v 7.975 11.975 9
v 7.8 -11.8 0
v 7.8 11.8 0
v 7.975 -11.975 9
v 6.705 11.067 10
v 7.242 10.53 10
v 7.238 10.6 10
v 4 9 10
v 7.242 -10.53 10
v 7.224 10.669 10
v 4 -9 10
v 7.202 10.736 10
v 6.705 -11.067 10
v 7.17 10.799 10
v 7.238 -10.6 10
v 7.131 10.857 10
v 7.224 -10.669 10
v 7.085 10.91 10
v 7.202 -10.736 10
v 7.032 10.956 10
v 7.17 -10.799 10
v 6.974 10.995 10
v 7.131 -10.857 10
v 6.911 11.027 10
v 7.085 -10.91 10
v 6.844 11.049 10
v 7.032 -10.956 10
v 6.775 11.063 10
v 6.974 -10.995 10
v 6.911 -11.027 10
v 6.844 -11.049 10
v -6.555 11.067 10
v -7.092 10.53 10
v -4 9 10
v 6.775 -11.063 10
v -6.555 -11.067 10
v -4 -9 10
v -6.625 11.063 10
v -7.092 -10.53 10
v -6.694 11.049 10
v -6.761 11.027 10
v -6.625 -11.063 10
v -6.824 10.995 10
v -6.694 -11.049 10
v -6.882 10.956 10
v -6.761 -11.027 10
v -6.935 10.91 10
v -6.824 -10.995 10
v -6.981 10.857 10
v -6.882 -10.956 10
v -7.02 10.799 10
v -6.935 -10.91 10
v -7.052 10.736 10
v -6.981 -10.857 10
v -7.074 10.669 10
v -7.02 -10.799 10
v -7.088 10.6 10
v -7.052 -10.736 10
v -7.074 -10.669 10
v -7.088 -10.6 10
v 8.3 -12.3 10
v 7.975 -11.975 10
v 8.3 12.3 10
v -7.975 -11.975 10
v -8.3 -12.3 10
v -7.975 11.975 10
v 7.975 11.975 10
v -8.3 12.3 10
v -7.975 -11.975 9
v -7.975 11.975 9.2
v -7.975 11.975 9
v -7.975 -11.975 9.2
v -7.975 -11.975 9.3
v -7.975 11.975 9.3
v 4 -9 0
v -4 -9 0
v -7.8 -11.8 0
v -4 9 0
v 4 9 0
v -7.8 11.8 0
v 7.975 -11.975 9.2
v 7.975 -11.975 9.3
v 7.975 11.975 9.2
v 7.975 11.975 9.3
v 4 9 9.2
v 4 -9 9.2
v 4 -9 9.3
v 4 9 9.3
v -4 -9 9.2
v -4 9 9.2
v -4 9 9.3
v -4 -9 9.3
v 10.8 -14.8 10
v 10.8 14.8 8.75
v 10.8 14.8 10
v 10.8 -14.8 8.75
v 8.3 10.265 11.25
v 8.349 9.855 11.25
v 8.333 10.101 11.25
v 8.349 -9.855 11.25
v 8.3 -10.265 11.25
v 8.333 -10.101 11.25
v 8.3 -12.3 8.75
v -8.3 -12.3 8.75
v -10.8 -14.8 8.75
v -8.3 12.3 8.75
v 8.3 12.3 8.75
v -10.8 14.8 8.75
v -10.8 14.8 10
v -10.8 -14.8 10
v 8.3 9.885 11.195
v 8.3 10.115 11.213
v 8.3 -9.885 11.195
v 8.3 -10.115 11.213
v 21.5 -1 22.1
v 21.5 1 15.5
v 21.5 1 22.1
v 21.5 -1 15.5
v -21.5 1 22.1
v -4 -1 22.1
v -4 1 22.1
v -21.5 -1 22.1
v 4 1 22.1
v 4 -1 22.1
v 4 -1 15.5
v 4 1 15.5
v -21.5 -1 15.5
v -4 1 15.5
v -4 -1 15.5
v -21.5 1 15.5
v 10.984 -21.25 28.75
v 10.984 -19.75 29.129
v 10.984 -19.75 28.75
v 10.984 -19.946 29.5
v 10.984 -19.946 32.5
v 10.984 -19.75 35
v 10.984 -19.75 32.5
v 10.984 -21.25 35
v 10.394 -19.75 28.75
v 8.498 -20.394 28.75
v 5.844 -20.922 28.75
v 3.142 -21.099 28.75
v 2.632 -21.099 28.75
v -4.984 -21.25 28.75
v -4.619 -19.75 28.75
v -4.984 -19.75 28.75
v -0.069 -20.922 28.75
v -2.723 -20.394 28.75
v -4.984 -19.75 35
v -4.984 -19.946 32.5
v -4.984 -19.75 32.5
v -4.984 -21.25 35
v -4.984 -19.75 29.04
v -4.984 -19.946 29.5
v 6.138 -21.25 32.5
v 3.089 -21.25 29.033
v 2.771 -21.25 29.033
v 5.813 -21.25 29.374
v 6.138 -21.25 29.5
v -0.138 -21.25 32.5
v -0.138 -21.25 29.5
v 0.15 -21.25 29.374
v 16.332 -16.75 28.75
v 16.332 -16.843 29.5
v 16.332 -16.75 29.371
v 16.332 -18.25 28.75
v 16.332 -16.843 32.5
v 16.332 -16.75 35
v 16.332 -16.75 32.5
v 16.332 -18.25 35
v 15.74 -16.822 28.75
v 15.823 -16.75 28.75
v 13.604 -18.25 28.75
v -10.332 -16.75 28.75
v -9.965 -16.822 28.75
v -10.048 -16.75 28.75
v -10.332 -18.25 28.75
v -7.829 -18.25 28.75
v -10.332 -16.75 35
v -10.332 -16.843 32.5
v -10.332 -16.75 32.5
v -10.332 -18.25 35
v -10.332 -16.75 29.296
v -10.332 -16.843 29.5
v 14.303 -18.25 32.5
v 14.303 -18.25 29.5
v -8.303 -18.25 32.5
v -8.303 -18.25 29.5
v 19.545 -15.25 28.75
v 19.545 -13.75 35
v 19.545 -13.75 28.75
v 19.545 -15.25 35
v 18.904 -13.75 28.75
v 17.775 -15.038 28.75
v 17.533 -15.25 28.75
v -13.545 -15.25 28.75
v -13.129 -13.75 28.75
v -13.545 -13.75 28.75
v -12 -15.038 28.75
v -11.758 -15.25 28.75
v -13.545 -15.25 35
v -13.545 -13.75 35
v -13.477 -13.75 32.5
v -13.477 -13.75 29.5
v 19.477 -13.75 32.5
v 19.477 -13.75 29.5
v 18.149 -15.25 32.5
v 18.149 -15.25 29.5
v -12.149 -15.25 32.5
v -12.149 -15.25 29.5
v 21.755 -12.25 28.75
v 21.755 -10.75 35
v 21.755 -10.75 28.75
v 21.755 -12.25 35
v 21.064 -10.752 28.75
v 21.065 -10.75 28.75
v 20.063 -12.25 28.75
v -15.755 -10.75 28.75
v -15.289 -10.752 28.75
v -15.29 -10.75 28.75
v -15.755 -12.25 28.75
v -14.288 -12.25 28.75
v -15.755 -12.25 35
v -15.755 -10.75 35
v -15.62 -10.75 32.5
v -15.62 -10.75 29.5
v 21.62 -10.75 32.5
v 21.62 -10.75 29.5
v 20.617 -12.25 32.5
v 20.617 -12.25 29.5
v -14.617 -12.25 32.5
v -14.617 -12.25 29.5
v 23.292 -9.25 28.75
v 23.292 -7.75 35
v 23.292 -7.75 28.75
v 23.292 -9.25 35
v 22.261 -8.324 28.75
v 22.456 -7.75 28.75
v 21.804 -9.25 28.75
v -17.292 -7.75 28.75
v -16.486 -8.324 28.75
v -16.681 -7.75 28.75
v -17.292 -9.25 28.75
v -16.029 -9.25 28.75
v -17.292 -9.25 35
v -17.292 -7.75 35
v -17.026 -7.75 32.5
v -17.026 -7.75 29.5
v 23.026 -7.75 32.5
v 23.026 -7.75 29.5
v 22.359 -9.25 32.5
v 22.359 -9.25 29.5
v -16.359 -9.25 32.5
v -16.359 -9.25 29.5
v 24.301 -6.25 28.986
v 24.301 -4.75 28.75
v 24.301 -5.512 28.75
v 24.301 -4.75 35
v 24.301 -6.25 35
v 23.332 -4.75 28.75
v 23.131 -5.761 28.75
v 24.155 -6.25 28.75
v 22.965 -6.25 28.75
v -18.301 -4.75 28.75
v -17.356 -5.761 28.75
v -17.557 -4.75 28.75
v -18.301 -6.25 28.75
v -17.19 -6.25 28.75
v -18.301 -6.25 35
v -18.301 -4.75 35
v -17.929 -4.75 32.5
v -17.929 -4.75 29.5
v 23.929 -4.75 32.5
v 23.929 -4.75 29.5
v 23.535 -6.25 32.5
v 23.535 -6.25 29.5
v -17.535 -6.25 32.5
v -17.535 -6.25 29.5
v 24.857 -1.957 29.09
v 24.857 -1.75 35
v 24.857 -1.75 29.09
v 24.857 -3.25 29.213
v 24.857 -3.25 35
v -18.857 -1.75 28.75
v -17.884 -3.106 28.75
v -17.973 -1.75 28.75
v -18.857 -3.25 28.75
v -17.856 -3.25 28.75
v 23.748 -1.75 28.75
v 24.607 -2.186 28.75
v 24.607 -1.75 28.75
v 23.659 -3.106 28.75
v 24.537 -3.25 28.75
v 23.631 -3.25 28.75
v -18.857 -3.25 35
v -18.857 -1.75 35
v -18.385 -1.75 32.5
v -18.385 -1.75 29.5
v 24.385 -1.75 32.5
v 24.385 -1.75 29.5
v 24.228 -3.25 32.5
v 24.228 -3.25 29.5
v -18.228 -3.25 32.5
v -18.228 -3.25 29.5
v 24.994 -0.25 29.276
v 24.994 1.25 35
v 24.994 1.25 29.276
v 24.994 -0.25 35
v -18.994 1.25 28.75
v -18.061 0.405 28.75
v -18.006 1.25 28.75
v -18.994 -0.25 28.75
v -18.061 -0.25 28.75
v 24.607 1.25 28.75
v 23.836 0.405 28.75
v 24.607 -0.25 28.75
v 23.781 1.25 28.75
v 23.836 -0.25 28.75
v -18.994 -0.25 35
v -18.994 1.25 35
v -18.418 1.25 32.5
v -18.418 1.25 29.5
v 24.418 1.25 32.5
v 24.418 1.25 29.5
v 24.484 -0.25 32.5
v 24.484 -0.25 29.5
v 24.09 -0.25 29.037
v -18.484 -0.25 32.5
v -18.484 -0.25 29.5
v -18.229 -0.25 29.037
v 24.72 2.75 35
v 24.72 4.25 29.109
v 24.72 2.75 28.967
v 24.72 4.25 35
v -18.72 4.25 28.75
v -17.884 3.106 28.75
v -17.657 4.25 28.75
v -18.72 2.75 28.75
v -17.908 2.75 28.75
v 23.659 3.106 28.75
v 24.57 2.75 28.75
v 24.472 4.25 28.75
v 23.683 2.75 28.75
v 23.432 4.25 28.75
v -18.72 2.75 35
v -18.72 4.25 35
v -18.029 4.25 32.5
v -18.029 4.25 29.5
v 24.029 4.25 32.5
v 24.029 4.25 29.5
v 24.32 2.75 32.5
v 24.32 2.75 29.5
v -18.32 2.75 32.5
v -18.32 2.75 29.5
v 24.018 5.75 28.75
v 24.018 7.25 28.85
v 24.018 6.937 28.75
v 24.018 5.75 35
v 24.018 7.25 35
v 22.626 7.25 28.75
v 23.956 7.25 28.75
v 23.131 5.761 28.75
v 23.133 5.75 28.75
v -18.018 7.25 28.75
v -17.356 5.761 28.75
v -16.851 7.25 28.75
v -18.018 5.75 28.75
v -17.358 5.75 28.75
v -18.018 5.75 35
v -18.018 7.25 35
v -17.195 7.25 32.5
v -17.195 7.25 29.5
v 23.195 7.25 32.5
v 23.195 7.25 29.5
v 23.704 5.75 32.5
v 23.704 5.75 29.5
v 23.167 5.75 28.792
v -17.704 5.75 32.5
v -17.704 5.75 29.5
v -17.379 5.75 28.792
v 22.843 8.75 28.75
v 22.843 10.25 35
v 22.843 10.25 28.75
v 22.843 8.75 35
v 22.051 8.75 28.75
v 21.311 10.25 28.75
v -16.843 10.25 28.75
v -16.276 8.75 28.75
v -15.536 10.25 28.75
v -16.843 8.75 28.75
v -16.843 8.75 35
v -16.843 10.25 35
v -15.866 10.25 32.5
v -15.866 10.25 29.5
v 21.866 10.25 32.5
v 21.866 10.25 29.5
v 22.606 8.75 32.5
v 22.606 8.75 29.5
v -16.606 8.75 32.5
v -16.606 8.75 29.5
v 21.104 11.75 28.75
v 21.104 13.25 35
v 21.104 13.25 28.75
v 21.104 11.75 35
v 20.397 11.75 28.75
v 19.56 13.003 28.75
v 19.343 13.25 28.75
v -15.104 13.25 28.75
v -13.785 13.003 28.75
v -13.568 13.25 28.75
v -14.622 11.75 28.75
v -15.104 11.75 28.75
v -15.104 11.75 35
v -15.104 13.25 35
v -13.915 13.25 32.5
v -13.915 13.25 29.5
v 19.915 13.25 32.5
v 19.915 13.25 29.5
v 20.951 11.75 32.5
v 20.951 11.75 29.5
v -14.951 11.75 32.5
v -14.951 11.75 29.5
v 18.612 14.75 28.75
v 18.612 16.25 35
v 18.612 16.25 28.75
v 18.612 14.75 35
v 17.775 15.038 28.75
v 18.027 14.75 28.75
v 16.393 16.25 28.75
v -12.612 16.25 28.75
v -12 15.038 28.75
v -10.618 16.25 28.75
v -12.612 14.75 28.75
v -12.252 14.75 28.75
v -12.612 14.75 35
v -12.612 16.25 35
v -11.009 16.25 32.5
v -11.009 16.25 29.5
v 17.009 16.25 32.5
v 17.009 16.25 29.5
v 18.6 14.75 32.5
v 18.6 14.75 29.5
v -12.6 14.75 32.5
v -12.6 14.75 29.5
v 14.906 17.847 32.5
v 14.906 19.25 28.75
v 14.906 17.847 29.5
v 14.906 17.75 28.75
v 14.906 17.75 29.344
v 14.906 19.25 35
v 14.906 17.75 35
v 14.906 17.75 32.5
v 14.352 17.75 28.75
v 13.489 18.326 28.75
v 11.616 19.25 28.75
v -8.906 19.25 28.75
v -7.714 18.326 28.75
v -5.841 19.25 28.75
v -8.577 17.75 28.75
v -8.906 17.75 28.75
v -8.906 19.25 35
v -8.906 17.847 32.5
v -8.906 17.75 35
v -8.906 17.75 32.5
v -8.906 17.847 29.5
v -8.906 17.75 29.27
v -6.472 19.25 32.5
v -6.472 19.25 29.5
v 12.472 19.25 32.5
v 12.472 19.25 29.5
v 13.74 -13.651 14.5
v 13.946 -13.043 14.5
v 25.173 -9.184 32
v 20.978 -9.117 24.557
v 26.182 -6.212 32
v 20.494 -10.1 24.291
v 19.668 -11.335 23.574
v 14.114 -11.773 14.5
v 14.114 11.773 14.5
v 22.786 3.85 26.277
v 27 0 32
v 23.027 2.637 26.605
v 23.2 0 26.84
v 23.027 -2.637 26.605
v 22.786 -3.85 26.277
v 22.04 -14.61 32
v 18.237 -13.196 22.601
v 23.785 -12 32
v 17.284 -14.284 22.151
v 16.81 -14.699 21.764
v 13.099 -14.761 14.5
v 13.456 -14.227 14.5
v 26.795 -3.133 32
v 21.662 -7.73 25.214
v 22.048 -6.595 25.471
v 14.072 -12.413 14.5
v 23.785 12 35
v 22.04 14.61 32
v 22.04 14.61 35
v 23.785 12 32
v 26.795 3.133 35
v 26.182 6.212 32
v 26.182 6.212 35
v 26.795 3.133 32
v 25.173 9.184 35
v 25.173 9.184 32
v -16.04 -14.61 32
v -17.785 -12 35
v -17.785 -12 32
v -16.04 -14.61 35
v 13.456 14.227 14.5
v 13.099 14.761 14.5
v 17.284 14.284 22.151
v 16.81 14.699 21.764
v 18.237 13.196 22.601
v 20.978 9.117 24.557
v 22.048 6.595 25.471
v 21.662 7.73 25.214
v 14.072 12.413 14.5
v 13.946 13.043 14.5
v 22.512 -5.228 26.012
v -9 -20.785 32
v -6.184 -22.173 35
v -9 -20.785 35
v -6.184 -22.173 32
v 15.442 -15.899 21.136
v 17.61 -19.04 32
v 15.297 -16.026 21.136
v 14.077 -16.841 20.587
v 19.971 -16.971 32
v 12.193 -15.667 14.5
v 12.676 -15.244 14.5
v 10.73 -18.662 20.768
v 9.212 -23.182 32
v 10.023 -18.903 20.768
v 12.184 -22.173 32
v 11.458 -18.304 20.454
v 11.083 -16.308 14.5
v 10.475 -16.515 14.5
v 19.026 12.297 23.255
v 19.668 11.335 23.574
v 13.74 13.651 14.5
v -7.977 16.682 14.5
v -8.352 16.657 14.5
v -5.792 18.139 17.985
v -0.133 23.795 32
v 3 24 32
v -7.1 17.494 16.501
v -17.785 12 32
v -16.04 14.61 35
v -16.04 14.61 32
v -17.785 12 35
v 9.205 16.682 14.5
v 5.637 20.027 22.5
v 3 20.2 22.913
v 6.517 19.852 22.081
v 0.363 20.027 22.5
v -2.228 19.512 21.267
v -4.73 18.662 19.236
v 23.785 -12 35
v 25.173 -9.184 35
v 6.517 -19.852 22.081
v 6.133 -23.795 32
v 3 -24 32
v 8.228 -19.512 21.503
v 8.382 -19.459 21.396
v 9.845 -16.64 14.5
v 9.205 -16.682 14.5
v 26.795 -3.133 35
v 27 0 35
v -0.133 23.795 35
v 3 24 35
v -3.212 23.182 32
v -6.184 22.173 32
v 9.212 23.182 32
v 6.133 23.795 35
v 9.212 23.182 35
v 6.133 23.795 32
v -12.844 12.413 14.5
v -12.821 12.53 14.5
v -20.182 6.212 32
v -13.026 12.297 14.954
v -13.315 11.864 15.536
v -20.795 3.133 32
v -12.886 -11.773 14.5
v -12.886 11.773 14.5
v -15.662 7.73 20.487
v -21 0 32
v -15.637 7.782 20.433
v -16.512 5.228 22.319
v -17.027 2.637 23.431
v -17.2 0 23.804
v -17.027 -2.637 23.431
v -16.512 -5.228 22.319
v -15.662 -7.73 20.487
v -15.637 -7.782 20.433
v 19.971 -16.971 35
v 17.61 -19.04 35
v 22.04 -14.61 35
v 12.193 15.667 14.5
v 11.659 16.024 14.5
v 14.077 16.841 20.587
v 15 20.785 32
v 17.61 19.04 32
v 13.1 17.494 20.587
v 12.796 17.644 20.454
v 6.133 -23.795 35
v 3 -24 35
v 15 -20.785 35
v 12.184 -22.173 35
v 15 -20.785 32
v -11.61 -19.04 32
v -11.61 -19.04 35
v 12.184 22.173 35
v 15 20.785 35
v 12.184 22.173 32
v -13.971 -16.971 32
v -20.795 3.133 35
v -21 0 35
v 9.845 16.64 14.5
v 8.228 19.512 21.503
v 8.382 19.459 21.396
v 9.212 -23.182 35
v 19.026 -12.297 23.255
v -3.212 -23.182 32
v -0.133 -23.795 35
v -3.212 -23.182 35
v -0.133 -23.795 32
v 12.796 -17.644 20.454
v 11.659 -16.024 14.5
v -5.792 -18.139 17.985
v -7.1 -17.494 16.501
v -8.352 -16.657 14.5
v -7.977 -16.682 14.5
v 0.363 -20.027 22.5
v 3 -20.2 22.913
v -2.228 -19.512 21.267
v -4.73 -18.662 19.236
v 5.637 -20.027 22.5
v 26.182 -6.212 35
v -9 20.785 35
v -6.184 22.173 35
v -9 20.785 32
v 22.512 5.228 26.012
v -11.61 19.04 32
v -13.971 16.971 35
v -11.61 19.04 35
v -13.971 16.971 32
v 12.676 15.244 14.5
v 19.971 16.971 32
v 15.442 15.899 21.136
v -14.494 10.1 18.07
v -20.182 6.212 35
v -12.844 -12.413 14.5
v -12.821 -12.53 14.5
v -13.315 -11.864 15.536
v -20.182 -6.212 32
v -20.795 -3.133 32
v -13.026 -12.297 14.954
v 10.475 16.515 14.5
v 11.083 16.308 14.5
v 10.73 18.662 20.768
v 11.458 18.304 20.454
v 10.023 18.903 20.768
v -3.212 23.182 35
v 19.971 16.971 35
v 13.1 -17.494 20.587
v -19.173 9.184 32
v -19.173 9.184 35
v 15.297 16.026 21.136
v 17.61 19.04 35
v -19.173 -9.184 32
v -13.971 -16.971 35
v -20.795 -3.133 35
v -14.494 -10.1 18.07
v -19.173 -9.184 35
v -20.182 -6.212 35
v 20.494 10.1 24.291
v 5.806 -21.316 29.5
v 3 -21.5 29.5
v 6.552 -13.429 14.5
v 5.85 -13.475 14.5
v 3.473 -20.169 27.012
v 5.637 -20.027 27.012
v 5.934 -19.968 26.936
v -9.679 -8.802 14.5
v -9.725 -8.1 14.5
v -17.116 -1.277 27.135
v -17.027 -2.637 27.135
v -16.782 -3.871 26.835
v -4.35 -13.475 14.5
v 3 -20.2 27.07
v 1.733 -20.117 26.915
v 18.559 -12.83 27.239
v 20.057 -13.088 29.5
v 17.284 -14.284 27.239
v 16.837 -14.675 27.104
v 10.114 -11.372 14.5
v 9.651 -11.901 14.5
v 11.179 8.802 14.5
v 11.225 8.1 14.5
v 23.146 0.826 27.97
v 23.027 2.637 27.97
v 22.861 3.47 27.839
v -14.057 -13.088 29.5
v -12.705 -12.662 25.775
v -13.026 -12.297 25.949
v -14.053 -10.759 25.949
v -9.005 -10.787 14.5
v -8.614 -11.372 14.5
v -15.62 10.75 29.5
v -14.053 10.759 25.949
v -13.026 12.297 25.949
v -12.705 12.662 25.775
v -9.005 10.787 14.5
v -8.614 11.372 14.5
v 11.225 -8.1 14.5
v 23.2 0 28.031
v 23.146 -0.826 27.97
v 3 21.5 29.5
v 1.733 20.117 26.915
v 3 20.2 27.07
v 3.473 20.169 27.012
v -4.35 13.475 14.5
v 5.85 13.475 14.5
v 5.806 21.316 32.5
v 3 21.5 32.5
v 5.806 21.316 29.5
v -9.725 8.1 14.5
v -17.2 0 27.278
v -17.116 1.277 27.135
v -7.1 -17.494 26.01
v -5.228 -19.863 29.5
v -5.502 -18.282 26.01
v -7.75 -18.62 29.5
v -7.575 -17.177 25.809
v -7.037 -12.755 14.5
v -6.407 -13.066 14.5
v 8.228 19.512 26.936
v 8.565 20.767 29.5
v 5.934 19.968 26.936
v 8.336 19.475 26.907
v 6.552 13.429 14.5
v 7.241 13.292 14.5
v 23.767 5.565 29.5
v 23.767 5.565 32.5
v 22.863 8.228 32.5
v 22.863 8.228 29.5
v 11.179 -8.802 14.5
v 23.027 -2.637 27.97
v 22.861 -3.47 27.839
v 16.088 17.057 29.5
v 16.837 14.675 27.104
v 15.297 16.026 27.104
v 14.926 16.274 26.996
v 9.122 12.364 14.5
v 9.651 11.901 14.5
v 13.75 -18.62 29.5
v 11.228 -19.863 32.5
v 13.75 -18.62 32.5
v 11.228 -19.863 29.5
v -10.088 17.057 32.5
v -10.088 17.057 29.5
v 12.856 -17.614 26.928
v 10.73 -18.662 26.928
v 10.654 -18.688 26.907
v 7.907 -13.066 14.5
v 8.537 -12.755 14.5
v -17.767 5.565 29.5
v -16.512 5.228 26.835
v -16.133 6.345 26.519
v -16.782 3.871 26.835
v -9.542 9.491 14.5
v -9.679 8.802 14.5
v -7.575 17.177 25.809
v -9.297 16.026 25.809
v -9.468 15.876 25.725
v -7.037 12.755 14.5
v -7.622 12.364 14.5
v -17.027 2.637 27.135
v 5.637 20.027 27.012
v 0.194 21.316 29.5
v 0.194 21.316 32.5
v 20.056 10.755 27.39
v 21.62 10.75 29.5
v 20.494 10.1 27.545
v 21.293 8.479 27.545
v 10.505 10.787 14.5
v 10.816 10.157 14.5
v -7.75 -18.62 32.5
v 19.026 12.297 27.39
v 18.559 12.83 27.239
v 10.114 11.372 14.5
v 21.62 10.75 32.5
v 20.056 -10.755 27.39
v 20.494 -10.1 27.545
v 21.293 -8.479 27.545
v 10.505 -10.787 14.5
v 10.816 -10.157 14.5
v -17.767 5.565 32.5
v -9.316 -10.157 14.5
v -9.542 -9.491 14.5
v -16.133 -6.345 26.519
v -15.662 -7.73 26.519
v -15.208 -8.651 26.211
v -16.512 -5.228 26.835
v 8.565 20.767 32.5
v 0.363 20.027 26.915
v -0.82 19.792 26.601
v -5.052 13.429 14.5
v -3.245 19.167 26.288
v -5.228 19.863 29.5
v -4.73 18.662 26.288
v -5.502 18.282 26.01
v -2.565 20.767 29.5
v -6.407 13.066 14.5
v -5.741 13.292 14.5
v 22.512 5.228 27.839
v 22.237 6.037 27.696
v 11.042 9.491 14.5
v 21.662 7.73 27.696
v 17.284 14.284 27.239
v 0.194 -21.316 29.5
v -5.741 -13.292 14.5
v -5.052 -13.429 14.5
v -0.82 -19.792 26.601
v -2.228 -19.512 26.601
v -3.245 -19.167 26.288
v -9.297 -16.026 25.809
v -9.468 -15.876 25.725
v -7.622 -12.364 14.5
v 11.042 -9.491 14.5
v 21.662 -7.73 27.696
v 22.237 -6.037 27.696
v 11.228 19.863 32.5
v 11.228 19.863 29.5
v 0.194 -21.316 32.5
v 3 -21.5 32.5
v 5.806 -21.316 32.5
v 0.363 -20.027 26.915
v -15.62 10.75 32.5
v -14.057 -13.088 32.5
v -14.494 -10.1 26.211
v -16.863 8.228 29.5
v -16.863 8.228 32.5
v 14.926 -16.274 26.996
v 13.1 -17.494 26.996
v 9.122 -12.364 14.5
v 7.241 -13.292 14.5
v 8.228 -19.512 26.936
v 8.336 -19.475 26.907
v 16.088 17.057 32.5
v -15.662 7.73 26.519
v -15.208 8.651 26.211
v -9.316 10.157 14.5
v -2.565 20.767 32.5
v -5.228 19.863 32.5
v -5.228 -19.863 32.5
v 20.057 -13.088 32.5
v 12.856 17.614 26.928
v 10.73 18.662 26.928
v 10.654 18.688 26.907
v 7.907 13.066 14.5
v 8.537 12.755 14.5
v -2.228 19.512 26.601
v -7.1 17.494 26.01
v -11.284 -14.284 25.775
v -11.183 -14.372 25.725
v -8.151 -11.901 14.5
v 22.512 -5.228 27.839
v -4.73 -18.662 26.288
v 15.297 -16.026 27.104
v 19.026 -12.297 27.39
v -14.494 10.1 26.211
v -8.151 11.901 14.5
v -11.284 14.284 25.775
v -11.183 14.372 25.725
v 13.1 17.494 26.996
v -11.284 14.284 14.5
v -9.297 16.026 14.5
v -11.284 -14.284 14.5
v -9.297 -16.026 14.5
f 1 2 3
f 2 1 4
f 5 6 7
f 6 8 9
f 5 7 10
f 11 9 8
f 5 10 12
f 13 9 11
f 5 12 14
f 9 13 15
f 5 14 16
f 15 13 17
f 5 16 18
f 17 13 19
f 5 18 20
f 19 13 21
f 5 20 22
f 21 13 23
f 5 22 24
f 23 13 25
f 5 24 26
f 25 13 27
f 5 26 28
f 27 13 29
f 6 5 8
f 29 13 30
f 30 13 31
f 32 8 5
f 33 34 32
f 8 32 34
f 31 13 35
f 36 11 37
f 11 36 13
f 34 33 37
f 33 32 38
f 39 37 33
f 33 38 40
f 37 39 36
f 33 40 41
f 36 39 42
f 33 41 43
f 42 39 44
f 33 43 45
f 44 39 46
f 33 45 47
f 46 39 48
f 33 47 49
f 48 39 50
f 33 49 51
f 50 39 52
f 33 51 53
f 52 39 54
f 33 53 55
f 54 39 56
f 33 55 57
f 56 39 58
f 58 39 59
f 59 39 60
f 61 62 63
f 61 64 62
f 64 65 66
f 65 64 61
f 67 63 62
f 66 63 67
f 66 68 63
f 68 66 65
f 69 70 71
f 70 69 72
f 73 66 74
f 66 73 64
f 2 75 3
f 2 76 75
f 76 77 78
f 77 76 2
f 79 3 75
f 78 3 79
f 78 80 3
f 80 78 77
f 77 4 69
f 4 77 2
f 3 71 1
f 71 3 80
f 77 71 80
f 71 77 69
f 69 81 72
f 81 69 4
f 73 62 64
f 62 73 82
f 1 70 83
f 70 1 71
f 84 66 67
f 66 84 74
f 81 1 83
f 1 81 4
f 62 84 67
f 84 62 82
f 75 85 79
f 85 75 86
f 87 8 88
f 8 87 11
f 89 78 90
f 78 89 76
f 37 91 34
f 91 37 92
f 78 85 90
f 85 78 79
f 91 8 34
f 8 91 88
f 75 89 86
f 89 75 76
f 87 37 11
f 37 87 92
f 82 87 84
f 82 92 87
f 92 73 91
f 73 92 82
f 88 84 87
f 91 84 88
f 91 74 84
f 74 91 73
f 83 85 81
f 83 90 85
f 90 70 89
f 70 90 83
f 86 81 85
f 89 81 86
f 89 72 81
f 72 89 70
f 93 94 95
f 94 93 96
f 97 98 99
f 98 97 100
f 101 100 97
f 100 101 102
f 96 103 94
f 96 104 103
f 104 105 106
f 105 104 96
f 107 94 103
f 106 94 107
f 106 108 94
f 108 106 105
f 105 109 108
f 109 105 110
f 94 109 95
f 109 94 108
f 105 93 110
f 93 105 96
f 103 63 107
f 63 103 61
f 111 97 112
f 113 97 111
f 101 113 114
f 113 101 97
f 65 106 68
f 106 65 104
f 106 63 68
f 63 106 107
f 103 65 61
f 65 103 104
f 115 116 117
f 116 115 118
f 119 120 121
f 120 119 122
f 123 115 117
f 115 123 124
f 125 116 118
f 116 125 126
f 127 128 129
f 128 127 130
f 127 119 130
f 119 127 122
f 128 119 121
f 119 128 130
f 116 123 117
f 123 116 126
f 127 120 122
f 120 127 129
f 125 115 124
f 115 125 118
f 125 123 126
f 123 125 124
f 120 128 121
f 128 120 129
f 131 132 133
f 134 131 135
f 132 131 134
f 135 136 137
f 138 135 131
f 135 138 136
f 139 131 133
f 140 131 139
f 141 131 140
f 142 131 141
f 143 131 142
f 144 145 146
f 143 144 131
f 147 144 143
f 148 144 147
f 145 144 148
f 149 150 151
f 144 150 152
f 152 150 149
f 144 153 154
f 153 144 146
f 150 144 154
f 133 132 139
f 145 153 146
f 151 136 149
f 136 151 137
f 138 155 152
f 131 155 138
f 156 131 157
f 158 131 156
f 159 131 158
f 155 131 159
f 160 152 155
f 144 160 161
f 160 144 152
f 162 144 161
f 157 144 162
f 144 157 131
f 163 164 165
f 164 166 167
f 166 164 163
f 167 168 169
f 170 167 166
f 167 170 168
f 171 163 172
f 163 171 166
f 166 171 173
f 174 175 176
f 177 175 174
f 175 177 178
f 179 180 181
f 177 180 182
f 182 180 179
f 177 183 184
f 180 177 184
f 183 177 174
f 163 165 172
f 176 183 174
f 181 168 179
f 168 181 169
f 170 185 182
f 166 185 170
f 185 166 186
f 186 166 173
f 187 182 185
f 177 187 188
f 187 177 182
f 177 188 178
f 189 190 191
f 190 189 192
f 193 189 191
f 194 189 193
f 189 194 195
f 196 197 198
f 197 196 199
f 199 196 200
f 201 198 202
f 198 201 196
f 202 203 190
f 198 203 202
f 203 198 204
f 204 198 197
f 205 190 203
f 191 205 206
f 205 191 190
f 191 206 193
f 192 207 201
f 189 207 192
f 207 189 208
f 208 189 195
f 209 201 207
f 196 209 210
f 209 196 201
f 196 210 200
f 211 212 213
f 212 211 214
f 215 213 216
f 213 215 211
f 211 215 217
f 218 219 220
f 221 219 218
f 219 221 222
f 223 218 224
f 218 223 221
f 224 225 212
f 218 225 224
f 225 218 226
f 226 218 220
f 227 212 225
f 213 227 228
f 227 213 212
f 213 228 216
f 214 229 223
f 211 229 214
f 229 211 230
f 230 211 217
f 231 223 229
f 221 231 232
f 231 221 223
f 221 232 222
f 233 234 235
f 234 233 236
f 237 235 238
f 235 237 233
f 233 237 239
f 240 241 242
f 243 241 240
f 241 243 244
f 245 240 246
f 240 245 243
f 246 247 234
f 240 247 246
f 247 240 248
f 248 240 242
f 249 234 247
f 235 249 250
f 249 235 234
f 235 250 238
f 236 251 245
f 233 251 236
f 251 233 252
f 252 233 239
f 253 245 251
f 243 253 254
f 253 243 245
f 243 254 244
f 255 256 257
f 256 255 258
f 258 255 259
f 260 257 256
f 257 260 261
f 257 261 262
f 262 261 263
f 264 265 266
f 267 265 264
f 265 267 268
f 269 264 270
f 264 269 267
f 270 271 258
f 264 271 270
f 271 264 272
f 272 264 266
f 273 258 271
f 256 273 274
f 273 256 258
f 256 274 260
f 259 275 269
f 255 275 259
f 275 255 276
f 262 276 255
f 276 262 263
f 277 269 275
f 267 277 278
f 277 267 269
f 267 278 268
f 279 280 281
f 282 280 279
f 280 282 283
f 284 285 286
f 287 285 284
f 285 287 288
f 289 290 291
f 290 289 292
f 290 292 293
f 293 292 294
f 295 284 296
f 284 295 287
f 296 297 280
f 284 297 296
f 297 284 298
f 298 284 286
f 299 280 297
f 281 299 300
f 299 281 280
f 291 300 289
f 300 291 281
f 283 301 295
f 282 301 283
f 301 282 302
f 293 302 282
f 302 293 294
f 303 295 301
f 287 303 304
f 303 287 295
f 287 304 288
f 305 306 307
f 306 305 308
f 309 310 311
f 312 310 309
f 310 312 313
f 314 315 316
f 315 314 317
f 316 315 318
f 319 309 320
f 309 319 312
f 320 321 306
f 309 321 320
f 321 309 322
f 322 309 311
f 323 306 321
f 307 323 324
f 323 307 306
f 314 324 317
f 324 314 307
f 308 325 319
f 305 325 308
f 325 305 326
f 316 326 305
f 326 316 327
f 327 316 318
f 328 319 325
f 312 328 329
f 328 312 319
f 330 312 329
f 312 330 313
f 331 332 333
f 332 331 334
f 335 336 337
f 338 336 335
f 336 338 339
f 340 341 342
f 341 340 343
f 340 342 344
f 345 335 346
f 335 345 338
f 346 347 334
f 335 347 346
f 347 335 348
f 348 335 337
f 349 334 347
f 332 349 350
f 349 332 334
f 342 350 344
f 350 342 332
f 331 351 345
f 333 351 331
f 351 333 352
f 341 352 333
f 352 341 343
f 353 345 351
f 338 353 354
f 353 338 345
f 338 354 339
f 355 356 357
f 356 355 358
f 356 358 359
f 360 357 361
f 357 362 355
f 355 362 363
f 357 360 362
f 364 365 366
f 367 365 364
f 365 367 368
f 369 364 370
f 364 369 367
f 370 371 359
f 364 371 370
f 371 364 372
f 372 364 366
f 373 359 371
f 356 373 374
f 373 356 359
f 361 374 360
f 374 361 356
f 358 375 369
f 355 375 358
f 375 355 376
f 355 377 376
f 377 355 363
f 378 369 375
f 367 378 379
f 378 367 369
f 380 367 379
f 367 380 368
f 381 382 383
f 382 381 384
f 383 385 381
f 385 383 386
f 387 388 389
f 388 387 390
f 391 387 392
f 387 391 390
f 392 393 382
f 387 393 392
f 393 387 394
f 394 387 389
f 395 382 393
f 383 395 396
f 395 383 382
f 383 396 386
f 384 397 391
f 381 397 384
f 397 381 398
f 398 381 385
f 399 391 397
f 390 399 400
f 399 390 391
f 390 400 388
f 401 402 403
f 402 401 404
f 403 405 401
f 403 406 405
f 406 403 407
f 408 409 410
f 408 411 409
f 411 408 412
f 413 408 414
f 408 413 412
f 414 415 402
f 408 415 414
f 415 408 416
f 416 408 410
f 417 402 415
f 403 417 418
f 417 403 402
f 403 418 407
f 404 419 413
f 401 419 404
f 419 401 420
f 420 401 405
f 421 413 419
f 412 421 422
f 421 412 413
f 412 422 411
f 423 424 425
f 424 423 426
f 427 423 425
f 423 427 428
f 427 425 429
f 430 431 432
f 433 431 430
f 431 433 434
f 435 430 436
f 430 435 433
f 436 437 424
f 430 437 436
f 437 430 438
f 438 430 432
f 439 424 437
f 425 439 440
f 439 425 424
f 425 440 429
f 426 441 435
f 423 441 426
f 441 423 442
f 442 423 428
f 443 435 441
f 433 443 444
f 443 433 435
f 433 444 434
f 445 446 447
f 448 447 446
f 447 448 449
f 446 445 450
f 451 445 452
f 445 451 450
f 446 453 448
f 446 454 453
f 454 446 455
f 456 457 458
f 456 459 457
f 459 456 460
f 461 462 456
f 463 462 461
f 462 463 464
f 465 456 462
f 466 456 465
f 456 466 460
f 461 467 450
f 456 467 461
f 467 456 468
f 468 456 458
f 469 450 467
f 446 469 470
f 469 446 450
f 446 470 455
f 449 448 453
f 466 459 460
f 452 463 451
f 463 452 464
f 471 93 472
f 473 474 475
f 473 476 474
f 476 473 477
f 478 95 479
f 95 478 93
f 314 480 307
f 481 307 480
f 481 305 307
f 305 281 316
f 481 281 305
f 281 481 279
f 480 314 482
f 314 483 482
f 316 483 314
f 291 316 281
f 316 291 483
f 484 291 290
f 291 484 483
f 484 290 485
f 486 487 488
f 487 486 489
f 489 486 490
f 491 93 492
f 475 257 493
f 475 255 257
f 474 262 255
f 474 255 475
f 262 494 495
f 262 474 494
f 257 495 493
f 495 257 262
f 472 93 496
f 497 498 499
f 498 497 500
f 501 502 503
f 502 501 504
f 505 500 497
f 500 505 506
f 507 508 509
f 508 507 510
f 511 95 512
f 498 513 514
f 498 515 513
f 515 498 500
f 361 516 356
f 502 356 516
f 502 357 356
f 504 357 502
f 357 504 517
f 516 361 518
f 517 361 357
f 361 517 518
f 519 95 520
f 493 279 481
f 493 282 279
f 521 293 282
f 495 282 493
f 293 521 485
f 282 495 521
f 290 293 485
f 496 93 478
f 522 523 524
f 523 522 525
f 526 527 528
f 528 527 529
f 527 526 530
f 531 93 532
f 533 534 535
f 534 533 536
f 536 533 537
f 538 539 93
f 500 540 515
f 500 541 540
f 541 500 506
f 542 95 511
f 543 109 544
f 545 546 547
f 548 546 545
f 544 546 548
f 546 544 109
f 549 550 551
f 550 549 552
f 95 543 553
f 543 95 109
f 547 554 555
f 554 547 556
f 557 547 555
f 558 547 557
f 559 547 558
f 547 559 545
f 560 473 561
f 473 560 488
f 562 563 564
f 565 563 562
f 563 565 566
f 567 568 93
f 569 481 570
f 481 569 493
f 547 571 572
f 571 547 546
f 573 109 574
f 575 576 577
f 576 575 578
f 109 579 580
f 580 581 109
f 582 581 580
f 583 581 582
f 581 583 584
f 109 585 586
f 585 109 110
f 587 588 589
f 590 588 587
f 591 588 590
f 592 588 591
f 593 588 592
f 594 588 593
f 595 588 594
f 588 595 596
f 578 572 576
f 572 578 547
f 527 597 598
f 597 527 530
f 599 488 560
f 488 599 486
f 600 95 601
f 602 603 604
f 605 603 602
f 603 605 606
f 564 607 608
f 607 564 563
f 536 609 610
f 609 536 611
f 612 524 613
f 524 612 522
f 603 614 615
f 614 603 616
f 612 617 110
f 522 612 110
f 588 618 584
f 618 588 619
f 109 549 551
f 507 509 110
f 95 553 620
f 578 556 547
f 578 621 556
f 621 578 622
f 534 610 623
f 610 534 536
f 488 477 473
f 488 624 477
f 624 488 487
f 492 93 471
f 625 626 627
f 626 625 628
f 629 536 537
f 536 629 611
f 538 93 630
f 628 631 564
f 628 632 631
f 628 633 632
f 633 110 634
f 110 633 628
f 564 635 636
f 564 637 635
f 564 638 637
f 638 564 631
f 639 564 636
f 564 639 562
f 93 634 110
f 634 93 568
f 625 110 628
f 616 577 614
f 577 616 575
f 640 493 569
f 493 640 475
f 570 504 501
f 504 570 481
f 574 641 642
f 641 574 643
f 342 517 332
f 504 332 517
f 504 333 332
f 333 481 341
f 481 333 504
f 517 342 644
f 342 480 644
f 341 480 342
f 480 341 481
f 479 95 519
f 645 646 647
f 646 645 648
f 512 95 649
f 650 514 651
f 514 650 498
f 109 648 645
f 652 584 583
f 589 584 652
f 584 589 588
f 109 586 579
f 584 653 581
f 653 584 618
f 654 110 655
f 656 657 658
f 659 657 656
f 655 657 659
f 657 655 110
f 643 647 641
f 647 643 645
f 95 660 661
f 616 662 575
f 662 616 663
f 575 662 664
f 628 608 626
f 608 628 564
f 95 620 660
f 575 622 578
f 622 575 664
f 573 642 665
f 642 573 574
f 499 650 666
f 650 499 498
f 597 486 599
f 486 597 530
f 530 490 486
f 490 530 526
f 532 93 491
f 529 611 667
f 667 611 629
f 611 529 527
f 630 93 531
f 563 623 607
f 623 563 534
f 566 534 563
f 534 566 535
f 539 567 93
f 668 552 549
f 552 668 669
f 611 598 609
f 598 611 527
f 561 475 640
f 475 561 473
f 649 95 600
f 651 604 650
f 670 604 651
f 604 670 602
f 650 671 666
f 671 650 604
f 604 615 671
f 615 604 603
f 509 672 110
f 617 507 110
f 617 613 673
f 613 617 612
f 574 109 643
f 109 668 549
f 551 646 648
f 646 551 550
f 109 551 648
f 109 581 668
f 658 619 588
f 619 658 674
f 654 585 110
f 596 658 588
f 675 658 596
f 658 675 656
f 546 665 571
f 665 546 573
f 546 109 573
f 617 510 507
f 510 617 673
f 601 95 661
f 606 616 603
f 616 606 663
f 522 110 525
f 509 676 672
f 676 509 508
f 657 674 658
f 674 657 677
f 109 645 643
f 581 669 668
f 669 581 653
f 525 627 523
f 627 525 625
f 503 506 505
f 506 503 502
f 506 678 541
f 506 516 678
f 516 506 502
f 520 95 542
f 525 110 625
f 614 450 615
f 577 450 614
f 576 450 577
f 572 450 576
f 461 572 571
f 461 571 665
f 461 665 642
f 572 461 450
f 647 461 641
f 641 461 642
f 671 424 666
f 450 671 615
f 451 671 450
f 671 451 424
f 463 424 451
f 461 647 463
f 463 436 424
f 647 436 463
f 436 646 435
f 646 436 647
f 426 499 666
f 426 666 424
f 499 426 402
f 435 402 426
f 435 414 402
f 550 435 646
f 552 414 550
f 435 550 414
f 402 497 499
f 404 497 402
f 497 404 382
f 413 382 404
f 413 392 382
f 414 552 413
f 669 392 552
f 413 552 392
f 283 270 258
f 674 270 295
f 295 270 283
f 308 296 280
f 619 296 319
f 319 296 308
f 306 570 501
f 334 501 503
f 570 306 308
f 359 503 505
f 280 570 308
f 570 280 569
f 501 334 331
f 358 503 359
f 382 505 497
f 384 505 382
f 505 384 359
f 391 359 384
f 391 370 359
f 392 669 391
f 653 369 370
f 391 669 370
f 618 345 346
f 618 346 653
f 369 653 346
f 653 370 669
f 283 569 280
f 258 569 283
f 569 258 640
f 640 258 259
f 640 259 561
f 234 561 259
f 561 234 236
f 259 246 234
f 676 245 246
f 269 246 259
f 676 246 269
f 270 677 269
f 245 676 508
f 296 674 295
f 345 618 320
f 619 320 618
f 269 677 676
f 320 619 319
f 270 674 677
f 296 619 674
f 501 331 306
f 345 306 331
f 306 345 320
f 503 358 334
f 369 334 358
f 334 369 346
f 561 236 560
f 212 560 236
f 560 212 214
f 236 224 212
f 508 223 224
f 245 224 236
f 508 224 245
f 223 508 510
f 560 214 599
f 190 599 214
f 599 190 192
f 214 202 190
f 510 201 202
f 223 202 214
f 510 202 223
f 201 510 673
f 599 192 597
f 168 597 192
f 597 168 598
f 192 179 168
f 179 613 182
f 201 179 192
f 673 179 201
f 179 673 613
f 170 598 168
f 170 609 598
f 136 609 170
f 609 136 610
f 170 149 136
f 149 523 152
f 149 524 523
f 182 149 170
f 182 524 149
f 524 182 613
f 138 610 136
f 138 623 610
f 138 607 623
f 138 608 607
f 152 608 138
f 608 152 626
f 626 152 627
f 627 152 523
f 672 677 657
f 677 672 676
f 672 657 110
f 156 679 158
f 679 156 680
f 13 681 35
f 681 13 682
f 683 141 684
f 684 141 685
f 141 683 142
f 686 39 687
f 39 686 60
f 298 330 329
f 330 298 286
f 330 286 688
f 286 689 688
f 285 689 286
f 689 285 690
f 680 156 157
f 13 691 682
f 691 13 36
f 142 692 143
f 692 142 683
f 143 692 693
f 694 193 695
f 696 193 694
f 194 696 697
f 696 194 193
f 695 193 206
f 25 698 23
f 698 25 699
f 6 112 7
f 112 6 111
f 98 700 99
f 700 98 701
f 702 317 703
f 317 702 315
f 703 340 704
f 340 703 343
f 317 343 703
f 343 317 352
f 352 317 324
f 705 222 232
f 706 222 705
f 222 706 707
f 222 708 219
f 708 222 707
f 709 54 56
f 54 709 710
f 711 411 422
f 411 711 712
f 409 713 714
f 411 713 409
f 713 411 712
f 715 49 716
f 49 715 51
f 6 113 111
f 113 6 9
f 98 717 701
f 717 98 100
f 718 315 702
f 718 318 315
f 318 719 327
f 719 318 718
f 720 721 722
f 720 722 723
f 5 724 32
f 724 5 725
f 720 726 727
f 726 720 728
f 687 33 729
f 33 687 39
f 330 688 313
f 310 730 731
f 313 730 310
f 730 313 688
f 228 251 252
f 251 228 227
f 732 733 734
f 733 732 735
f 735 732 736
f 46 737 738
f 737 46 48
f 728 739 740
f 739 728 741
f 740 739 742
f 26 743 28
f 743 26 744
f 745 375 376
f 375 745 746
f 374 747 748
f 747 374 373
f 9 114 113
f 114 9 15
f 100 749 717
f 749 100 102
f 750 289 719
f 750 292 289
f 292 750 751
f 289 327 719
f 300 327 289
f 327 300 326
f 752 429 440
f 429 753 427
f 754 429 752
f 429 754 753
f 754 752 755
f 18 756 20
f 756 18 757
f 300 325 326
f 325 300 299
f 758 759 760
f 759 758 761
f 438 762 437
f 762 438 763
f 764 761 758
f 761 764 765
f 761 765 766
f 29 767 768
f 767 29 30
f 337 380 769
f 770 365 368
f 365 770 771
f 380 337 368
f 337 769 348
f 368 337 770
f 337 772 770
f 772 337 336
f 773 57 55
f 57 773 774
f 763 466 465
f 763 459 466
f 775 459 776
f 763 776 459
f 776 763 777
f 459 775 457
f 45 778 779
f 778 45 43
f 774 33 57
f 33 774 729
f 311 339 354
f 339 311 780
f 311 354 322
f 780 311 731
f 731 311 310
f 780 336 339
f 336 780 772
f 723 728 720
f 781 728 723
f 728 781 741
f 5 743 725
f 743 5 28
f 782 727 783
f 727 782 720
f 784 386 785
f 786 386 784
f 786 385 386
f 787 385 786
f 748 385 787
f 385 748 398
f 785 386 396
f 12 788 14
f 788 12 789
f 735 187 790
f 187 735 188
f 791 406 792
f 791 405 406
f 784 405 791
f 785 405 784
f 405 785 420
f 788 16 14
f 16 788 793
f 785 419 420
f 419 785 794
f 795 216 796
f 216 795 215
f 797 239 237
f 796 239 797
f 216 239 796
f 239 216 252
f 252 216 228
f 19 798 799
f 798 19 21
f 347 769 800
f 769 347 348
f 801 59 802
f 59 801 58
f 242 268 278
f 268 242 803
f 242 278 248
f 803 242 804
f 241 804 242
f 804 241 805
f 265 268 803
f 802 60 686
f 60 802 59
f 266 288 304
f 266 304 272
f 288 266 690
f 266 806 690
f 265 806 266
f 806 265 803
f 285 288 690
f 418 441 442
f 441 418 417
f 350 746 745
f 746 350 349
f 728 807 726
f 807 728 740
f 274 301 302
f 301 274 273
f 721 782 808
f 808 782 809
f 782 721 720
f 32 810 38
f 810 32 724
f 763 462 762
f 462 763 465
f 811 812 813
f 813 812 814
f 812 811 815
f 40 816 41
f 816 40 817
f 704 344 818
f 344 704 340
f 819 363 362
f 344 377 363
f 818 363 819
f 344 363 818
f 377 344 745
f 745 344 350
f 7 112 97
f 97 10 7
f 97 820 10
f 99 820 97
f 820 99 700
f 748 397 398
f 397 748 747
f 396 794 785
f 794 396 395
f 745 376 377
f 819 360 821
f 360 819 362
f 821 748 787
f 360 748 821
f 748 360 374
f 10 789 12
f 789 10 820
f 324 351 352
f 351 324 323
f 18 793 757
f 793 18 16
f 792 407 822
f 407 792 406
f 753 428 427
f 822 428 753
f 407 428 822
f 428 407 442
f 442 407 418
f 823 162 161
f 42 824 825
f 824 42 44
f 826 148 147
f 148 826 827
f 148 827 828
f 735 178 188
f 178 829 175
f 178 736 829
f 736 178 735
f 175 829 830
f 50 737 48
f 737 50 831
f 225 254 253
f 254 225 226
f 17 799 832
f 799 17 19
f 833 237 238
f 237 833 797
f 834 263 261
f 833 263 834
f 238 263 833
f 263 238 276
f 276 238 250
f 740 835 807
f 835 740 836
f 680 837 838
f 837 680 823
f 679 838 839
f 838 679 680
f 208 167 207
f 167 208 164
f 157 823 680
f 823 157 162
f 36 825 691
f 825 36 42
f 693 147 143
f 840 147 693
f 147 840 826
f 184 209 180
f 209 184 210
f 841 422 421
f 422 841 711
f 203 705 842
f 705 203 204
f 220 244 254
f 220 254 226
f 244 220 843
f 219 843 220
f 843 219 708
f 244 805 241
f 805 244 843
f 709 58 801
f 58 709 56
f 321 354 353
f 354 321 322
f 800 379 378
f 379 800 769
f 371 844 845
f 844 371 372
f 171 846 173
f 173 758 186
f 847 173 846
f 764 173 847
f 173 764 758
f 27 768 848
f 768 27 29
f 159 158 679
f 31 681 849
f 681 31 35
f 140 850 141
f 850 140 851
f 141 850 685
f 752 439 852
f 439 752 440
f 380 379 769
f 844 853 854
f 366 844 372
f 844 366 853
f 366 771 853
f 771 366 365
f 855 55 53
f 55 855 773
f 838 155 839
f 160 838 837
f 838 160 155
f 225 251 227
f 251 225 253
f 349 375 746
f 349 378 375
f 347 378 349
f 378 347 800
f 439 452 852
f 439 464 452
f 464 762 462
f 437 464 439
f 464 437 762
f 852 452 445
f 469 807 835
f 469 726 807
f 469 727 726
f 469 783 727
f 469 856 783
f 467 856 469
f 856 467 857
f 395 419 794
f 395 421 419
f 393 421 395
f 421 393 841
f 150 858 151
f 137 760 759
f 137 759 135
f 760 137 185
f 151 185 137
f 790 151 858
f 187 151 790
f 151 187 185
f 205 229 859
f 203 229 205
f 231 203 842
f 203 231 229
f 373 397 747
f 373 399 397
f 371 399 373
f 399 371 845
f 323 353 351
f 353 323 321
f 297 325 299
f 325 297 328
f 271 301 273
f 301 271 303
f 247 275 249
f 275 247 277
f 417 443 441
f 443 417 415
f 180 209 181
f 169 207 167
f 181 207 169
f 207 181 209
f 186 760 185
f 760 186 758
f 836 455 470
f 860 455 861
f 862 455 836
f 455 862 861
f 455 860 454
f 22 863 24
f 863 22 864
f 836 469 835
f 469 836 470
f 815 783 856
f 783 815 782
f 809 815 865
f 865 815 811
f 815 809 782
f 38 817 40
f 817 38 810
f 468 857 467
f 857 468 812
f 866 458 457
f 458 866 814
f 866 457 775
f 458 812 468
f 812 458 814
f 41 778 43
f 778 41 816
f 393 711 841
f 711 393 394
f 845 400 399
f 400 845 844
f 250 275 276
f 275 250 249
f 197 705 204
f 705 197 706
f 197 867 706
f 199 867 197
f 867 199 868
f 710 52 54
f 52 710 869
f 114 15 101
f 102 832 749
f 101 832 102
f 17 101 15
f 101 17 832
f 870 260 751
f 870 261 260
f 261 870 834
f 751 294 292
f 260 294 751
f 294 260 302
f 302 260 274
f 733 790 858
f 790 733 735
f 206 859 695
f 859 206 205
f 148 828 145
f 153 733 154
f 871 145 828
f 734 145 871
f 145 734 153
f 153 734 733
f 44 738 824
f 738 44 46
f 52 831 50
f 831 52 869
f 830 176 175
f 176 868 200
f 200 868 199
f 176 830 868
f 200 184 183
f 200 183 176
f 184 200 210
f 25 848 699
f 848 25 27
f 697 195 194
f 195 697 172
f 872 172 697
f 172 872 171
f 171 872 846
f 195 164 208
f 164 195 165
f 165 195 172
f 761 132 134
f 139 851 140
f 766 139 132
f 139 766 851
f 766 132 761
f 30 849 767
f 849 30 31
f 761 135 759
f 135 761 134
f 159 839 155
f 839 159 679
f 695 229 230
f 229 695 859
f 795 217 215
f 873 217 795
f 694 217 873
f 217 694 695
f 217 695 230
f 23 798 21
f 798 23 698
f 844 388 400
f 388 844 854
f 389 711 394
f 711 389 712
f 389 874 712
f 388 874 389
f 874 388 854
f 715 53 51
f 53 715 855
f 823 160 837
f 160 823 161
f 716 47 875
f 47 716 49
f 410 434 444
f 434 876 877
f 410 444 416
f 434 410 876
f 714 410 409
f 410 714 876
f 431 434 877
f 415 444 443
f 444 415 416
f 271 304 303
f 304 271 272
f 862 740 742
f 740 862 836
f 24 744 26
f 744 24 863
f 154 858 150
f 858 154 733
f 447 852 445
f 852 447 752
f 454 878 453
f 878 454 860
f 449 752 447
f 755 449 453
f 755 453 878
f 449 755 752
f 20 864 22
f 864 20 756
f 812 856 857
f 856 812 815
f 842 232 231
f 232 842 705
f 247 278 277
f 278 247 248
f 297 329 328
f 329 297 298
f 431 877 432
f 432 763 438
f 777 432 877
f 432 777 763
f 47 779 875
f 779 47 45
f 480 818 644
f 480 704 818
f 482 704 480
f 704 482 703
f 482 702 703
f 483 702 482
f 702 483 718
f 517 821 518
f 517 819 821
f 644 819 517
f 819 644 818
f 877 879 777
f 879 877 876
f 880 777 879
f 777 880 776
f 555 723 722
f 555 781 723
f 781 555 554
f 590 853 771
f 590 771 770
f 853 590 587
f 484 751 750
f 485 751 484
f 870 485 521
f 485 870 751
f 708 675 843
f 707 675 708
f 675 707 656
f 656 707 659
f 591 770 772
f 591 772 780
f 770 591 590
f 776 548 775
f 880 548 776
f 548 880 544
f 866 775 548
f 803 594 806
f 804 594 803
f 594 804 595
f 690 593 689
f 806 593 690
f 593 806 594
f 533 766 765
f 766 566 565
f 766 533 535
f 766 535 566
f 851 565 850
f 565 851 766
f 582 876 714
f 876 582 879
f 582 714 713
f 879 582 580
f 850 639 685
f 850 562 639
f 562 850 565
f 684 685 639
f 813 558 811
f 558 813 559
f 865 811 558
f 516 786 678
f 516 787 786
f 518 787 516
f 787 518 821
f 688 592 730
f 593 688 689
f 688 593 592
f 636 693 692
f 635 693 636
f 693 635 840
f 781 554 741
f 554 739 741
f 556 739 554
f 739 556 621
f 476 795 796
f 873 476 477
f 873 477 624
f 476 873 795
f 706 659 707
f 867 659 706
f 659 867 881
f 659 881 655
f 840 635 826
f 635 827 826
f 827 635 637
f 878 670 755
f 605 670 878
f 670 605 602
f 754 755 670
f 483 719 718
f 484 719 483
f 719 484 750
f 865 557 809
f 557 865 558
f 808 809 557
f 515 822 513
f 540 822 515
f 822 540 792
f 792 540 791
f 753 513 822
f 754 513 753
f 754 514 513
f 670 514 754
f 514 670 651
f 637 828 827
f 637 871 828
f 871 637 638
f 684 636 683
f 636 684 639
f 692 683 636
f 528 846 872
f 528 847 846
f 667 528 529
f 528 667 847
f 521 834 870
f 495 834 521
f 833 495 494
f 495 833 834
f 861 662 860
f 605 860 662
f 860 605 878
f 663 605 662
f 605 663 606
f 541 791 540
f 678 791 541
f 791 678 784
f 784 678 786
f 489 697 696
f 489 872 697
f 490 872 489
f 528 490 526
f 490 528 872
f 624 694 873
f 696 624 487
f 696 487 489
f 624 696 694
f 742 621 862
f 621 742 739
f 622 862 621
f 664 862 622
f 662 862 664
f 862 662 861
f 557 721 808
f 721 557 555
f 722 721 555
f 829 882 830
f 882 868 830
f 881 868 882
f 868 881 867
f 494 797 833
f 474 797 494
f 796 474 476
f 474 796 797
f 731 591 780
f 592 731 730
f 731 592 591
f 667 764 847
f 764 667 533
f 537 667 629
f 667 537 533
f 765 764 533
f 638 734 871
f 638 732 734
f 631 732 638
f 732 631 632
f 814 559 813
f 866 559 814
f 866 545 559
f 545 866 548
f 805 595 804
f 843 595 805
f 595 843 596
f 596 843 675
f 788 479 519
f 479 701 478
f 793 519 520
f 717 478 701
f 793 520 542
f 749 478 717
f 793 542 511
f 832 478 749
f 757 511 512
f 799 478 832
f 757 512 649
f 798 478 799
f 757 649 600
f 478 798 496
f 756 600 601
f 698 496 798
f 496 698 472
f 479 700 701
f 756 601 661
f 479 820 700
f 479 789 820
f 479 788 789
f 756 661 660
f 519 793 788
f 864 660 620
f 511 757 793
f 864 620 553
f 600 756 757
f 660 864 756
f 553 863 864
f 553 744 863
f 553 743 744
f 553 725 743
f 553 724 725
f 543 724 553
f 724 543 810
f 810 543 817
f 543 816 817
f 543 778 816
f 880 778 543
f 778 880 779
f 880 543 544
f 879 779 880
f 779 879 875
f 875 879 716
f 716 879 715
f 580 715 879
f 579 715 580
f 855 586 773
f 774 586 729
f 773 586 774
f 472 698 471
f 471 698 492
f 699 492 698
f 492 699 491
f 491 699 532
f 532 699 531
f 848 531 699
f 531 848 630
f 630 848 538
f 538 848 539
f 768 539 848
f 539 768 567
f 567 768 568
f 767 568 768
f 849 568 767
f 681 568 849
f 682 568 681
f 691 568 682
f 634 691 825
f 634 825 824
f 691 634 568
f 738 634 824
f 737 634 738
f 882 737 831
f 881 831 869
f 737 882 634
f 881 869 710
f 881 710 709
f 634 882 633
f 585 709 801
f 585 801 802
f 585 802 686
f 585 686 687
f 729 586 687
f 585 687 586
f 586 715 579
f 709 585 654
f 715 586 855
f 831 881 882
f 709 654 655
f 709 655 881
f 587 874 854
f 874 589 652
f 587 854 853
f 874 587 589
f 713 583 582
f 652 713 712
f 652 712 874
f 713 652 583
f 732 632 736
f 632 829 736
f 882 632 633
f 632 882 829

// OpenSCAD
// file: sleds.scad
// ==========================================
// Xentient Framework - Universal Sled & Socket Library
// Shared modules for all peripheral caps
// ==========================================
// Per Framework §2: Universal Mating Protocol
// Female Socket (in hub): 24.4×16.4×10.0mm (0.4mm clearance), wire channel 18×8mm
// Male Sled (on cap base): 23.6×15.6×10.0mm, 1° draft, hollow 18×8mm
// Flange: +3mm each side (increased from +2mm for bearing strength)
// Units: mm

$fn = 64;

// ==========================================
// MALE SLED PARAMETERS
// ==========================================

Sled_W       = 23.6;    // Width (0.4mm tolerance in female 24.0mm)
Sled_H       = 15.6;    // Height (0.4mm tolerance in female 16.0mm)
Sled_D       = 10.0;    // Depth (insertion length)
Sled_Draft   = 1.0;     // 1-degree draft angle
Sled_Wire_W  = 18.0;    // Wire pass-through width
Sled_Wire_H  = 8.0;     // Wire pass-through height
Sled_Wall    = 2.0;     // Minimum wall thickness

// Derived
Sled_Draft_Off = Sled_D * tan(Sled_Draft);  // ~0.17mm per side

// ==========================================
// MODULE: male_sled()
// The plug base that inserts into the hub's female socket.
// All caps start with this at their base.
//
// Usage: difference() { male_sled(); /* your cap-specific cutouts */ }
// ==========================================

module male_sled() {
    difference() {
        // Outer body with 1° draft
        hull() {
            // Entry face (slightly larger for wedge fit)
            translate([0, 0, Sled_D - 0.5])
                cube([Sled_H + 2*Sled_Draft_Off,
                      Sled_W + 2*Sled_Draft_Off,
                      1], center=true);
            // Inner face (exact size)
            translate([0, 0, 0.5])
                cube([Sled_H, Sled_W, 1], center=true);
        }

        // Wire pass-through (hollow core)
        translate([0, 0, Sled_D / 2])
            cube([Sled_Wire_H, Sled_Wire_W, Sled_D + 2], center=true);

        // Entry chamfer (45° for easy insertion)
        chamfer_h = 1.5;
        translate([0, 0, Sled_D - chamfer_h/2])
            hull() {
                cube([Sled_H + 2*chamfer_h, Sled_W + 2*chamfer_h, 0.1], center=true);
                cube([Sled_H, Sled_W, 0.1], center=true);
            }
    }
}

// ==========================================
// MODULE: male_sled_with_flange()
// Adds a flange around the sled base for cap-to-hub transition.
// Flange sits flush against hub exterior face.
//
// flange_w: extra width beyond sled on each side
// flange_h: extra height beyond sled on each side
// flange_t: flange thickness
// ==========================================

module male_sled_with_flange(flange_w=3.0, flange_h=3.0, flange_t=2.0) {
    union() {
        male_sled();

        // Flange ring around sled entry
        translate([0, 0, Sled_D])
            difference() {
                cube([Sled_H + 2*flange_h,
                      Sled_W + 2*flange_w,
                      flange_t], center=true);
                // Cut sled opening through flange
                cube([Sled_H + 1, Sled_W + 1, flange_t + 2], center=true);
            }
    }
}

// ==========================================
// MODULE: wire_channel()
// Internal wire routing channel from sled to component.
// Extends from sled core outward through the cap body.
//
// length: distance from sled to component
// direction: "straight" or "angled"
// ==========================================

module wire_channel(length=15, direction="straight") {
    if (direction == "straight") {
        translate([0, 0, Sled_D / 2 + length / 2])
            cube([Sled_Wire_H, Sled_Wire_W, length + 1], center=true);
    }
}

// ==========================================
// VISUALIZATION HELPERS
// ==========================================

// Render just the sled for testing
// male_sled();
// main file
// ==========================================
// Xentient Framework - Housing 2: Speak (MAX98357A + 3W 8Ω Speaker)
// Trapezoidal flare housing with thermal divider
// ==========================================
// Component: MAX98357A amp (7×7mm) + 3W 8Ω speaker (40mm dia)
// Connection: 6-pin JST XH pigtail (I2S: VCC, GND, DIN, BCLK, LRC, GAIN)
// Socket: 90° face (near USB-C, ventilation)
// Per Framework §4 Housing 2
// IMPORTANT: Speaker (40mm) > Sled (24mm), housing MUST flare outward
// Units: mm

include <sleds.scad>;

$fn = 64;

// ==========================================
// COMPONENT DIMENSIONS
// ==========================================

Spk_Dia     = 40.0;    // Speaker diameter
Spk_Depth   = 15.0;    // Speaker magnet depth
Spk_Grille  = 1.5;     // Grille bar thickness
Amp_PCB_W   = 7.0;     // MAX98357A board width
Amp_PCB_H   = 7.0;     // MAX98357A board height
Amp_PCB_T   = 1.6;     // PCB thickness

// Housing dimensions
Flare_W     = 48.0;     // Max width at speaker end (40mm speaker + walls)
Flare_H     = 46.0;     // Max height at speaker end
Flare_Depth = 22.0;     // Depth from sled face to speaker front
House_Wall  = 2.5;      // Thicker walls for speaker vibration
Div_Wall_T  = 2.0;      // Thermal divider thickness

// Asymmetric offset — speaker extends more to one side
// to avoid blocking neighboring caps
Offset_X    = 3.0;      // Shift speaker center away from sled center

// ==========================================
// MODULE: housing_speak()
// ==========================================

module housing_speak() {
    union() {
        // Sled base with wider flange for trapezoidal transition
        male_sled_with_flange(flange_w=3.0, flange_h=3.0, flange_t=2.5);

        // Trapezoidal flare body
        translate([0, 0, Sled_D]) {
            // Thermal divider (ADDITIVE — solid wall between amp and speaker zones)
            // Spans inner cavity, separates amp zone (near sled) from speaker zone
            difference() {
                translate([0, 0, Flare_Depth * 0.4])
                    cube([Flare_W - 2*House_Wall, Div_Wall_T, Flare_Depth * 0.3], center=true);
                // Wire passthrough through divider
                translate([0, 0, Flare_Depth * 0.4])
                    cube([Sled_Wire_H, Sled_Wire_W + 2, Flare_Depth * 0.3 + 2], center=true);
            }

            difference() {
                // Outer shell: sled face → speaker flare
                hull() {
                    // Sled transition face
                    translate([0, 0, 1])
                        cube([Sled_H + 6, Sled_W + 6, 2], center=true);
                    // Speaker end face (asymmetric offset)
                    translate([Offset_X, 0, Flare_Depth])
                        cylinder(h=3, d1=Flare_W, d2=Flare_W, $fn=48);
                }

                // Inner cavity: sled channel → speaker chamber
                hull() {
                    translate([0, 0, 0.5])
                        cube([Sled_H - 2, Sled_W - 2, 2], center=true);
                    translate([Offset_X, 0, Flare_Depth - House_Wall])
                        cylinder(h=3, d=Flare_W - 2*House_Wall, $fn=48);
                }

                // Speaker grille (front face, offset)
                translate([Offset_X, 0, Flare_Depth])
                    grille_pattern(dia=Flare_W - 4, bar_w=Spk_Grille);

                // Speaker cutout (40mm diameter, 2mm inset from front)
                translate([Offset_X, 0, Flare_Depth - Spk_Depth - House_Wall])
                    cylinder(h=Spk_Depth + 1, d=Spk_Dia + 0.4, $fn=48);

                // MAX98357A mount shelf (behind divider, near sled)
                translate([0, 0, Sled_D * 0.3])
                    cube([Amp_PCB_W + 0.8, Amp_PCB_H + 0.8, 2], center=true);

                // Wire channel
                translate([0, 0, -2])
                    cube([Sled_Wire_H, Sled_Wire_W, Flare_Depth + 6], center=true);

                // Ventilation slits (top and bottom for amp heat dissipation)
                for (vz = [Flare_Depth * 0.2, Flare_Depth * 0.35]) {
                    // Top vent
                    translate([Offset_X, Flare_W/2 - 1, vz])
                        cube([8, House_Wall + 2, 3], center=true);
                    // Bottom vent
                    translate([Offset_X, -Flare_W/2 + 1, vz])
                        cube([8, House_Wall + 2, 3], center=true);
                }
            }
        }
    }
}

// ==========================================
// MODULE: grille_pattern()
// Creates a speaker grille with horizontal bars
// ==========================================

module grille_pattern(dia=36, bar_w=1.5, bar_spc=3.0) {
    n_bars = floor(dia / bar_spc);
    for (i = [0 : n_bars - 1]) {
        y_off = -dia/2 + i * bar_spc + bar_spc/2;
        chord_half = sqrt(max(0, (dia/2)*(dia/2) - y_off*y_off));
        if (chord_half > bar_w) {
            translate([0, y_off, 0])
                cube([2 * chord_half, bar_w, House_Wall + 4], center=true);
        }
    }
}

// ==========================================
// RENDER
// ==========================================

housing_speak();
